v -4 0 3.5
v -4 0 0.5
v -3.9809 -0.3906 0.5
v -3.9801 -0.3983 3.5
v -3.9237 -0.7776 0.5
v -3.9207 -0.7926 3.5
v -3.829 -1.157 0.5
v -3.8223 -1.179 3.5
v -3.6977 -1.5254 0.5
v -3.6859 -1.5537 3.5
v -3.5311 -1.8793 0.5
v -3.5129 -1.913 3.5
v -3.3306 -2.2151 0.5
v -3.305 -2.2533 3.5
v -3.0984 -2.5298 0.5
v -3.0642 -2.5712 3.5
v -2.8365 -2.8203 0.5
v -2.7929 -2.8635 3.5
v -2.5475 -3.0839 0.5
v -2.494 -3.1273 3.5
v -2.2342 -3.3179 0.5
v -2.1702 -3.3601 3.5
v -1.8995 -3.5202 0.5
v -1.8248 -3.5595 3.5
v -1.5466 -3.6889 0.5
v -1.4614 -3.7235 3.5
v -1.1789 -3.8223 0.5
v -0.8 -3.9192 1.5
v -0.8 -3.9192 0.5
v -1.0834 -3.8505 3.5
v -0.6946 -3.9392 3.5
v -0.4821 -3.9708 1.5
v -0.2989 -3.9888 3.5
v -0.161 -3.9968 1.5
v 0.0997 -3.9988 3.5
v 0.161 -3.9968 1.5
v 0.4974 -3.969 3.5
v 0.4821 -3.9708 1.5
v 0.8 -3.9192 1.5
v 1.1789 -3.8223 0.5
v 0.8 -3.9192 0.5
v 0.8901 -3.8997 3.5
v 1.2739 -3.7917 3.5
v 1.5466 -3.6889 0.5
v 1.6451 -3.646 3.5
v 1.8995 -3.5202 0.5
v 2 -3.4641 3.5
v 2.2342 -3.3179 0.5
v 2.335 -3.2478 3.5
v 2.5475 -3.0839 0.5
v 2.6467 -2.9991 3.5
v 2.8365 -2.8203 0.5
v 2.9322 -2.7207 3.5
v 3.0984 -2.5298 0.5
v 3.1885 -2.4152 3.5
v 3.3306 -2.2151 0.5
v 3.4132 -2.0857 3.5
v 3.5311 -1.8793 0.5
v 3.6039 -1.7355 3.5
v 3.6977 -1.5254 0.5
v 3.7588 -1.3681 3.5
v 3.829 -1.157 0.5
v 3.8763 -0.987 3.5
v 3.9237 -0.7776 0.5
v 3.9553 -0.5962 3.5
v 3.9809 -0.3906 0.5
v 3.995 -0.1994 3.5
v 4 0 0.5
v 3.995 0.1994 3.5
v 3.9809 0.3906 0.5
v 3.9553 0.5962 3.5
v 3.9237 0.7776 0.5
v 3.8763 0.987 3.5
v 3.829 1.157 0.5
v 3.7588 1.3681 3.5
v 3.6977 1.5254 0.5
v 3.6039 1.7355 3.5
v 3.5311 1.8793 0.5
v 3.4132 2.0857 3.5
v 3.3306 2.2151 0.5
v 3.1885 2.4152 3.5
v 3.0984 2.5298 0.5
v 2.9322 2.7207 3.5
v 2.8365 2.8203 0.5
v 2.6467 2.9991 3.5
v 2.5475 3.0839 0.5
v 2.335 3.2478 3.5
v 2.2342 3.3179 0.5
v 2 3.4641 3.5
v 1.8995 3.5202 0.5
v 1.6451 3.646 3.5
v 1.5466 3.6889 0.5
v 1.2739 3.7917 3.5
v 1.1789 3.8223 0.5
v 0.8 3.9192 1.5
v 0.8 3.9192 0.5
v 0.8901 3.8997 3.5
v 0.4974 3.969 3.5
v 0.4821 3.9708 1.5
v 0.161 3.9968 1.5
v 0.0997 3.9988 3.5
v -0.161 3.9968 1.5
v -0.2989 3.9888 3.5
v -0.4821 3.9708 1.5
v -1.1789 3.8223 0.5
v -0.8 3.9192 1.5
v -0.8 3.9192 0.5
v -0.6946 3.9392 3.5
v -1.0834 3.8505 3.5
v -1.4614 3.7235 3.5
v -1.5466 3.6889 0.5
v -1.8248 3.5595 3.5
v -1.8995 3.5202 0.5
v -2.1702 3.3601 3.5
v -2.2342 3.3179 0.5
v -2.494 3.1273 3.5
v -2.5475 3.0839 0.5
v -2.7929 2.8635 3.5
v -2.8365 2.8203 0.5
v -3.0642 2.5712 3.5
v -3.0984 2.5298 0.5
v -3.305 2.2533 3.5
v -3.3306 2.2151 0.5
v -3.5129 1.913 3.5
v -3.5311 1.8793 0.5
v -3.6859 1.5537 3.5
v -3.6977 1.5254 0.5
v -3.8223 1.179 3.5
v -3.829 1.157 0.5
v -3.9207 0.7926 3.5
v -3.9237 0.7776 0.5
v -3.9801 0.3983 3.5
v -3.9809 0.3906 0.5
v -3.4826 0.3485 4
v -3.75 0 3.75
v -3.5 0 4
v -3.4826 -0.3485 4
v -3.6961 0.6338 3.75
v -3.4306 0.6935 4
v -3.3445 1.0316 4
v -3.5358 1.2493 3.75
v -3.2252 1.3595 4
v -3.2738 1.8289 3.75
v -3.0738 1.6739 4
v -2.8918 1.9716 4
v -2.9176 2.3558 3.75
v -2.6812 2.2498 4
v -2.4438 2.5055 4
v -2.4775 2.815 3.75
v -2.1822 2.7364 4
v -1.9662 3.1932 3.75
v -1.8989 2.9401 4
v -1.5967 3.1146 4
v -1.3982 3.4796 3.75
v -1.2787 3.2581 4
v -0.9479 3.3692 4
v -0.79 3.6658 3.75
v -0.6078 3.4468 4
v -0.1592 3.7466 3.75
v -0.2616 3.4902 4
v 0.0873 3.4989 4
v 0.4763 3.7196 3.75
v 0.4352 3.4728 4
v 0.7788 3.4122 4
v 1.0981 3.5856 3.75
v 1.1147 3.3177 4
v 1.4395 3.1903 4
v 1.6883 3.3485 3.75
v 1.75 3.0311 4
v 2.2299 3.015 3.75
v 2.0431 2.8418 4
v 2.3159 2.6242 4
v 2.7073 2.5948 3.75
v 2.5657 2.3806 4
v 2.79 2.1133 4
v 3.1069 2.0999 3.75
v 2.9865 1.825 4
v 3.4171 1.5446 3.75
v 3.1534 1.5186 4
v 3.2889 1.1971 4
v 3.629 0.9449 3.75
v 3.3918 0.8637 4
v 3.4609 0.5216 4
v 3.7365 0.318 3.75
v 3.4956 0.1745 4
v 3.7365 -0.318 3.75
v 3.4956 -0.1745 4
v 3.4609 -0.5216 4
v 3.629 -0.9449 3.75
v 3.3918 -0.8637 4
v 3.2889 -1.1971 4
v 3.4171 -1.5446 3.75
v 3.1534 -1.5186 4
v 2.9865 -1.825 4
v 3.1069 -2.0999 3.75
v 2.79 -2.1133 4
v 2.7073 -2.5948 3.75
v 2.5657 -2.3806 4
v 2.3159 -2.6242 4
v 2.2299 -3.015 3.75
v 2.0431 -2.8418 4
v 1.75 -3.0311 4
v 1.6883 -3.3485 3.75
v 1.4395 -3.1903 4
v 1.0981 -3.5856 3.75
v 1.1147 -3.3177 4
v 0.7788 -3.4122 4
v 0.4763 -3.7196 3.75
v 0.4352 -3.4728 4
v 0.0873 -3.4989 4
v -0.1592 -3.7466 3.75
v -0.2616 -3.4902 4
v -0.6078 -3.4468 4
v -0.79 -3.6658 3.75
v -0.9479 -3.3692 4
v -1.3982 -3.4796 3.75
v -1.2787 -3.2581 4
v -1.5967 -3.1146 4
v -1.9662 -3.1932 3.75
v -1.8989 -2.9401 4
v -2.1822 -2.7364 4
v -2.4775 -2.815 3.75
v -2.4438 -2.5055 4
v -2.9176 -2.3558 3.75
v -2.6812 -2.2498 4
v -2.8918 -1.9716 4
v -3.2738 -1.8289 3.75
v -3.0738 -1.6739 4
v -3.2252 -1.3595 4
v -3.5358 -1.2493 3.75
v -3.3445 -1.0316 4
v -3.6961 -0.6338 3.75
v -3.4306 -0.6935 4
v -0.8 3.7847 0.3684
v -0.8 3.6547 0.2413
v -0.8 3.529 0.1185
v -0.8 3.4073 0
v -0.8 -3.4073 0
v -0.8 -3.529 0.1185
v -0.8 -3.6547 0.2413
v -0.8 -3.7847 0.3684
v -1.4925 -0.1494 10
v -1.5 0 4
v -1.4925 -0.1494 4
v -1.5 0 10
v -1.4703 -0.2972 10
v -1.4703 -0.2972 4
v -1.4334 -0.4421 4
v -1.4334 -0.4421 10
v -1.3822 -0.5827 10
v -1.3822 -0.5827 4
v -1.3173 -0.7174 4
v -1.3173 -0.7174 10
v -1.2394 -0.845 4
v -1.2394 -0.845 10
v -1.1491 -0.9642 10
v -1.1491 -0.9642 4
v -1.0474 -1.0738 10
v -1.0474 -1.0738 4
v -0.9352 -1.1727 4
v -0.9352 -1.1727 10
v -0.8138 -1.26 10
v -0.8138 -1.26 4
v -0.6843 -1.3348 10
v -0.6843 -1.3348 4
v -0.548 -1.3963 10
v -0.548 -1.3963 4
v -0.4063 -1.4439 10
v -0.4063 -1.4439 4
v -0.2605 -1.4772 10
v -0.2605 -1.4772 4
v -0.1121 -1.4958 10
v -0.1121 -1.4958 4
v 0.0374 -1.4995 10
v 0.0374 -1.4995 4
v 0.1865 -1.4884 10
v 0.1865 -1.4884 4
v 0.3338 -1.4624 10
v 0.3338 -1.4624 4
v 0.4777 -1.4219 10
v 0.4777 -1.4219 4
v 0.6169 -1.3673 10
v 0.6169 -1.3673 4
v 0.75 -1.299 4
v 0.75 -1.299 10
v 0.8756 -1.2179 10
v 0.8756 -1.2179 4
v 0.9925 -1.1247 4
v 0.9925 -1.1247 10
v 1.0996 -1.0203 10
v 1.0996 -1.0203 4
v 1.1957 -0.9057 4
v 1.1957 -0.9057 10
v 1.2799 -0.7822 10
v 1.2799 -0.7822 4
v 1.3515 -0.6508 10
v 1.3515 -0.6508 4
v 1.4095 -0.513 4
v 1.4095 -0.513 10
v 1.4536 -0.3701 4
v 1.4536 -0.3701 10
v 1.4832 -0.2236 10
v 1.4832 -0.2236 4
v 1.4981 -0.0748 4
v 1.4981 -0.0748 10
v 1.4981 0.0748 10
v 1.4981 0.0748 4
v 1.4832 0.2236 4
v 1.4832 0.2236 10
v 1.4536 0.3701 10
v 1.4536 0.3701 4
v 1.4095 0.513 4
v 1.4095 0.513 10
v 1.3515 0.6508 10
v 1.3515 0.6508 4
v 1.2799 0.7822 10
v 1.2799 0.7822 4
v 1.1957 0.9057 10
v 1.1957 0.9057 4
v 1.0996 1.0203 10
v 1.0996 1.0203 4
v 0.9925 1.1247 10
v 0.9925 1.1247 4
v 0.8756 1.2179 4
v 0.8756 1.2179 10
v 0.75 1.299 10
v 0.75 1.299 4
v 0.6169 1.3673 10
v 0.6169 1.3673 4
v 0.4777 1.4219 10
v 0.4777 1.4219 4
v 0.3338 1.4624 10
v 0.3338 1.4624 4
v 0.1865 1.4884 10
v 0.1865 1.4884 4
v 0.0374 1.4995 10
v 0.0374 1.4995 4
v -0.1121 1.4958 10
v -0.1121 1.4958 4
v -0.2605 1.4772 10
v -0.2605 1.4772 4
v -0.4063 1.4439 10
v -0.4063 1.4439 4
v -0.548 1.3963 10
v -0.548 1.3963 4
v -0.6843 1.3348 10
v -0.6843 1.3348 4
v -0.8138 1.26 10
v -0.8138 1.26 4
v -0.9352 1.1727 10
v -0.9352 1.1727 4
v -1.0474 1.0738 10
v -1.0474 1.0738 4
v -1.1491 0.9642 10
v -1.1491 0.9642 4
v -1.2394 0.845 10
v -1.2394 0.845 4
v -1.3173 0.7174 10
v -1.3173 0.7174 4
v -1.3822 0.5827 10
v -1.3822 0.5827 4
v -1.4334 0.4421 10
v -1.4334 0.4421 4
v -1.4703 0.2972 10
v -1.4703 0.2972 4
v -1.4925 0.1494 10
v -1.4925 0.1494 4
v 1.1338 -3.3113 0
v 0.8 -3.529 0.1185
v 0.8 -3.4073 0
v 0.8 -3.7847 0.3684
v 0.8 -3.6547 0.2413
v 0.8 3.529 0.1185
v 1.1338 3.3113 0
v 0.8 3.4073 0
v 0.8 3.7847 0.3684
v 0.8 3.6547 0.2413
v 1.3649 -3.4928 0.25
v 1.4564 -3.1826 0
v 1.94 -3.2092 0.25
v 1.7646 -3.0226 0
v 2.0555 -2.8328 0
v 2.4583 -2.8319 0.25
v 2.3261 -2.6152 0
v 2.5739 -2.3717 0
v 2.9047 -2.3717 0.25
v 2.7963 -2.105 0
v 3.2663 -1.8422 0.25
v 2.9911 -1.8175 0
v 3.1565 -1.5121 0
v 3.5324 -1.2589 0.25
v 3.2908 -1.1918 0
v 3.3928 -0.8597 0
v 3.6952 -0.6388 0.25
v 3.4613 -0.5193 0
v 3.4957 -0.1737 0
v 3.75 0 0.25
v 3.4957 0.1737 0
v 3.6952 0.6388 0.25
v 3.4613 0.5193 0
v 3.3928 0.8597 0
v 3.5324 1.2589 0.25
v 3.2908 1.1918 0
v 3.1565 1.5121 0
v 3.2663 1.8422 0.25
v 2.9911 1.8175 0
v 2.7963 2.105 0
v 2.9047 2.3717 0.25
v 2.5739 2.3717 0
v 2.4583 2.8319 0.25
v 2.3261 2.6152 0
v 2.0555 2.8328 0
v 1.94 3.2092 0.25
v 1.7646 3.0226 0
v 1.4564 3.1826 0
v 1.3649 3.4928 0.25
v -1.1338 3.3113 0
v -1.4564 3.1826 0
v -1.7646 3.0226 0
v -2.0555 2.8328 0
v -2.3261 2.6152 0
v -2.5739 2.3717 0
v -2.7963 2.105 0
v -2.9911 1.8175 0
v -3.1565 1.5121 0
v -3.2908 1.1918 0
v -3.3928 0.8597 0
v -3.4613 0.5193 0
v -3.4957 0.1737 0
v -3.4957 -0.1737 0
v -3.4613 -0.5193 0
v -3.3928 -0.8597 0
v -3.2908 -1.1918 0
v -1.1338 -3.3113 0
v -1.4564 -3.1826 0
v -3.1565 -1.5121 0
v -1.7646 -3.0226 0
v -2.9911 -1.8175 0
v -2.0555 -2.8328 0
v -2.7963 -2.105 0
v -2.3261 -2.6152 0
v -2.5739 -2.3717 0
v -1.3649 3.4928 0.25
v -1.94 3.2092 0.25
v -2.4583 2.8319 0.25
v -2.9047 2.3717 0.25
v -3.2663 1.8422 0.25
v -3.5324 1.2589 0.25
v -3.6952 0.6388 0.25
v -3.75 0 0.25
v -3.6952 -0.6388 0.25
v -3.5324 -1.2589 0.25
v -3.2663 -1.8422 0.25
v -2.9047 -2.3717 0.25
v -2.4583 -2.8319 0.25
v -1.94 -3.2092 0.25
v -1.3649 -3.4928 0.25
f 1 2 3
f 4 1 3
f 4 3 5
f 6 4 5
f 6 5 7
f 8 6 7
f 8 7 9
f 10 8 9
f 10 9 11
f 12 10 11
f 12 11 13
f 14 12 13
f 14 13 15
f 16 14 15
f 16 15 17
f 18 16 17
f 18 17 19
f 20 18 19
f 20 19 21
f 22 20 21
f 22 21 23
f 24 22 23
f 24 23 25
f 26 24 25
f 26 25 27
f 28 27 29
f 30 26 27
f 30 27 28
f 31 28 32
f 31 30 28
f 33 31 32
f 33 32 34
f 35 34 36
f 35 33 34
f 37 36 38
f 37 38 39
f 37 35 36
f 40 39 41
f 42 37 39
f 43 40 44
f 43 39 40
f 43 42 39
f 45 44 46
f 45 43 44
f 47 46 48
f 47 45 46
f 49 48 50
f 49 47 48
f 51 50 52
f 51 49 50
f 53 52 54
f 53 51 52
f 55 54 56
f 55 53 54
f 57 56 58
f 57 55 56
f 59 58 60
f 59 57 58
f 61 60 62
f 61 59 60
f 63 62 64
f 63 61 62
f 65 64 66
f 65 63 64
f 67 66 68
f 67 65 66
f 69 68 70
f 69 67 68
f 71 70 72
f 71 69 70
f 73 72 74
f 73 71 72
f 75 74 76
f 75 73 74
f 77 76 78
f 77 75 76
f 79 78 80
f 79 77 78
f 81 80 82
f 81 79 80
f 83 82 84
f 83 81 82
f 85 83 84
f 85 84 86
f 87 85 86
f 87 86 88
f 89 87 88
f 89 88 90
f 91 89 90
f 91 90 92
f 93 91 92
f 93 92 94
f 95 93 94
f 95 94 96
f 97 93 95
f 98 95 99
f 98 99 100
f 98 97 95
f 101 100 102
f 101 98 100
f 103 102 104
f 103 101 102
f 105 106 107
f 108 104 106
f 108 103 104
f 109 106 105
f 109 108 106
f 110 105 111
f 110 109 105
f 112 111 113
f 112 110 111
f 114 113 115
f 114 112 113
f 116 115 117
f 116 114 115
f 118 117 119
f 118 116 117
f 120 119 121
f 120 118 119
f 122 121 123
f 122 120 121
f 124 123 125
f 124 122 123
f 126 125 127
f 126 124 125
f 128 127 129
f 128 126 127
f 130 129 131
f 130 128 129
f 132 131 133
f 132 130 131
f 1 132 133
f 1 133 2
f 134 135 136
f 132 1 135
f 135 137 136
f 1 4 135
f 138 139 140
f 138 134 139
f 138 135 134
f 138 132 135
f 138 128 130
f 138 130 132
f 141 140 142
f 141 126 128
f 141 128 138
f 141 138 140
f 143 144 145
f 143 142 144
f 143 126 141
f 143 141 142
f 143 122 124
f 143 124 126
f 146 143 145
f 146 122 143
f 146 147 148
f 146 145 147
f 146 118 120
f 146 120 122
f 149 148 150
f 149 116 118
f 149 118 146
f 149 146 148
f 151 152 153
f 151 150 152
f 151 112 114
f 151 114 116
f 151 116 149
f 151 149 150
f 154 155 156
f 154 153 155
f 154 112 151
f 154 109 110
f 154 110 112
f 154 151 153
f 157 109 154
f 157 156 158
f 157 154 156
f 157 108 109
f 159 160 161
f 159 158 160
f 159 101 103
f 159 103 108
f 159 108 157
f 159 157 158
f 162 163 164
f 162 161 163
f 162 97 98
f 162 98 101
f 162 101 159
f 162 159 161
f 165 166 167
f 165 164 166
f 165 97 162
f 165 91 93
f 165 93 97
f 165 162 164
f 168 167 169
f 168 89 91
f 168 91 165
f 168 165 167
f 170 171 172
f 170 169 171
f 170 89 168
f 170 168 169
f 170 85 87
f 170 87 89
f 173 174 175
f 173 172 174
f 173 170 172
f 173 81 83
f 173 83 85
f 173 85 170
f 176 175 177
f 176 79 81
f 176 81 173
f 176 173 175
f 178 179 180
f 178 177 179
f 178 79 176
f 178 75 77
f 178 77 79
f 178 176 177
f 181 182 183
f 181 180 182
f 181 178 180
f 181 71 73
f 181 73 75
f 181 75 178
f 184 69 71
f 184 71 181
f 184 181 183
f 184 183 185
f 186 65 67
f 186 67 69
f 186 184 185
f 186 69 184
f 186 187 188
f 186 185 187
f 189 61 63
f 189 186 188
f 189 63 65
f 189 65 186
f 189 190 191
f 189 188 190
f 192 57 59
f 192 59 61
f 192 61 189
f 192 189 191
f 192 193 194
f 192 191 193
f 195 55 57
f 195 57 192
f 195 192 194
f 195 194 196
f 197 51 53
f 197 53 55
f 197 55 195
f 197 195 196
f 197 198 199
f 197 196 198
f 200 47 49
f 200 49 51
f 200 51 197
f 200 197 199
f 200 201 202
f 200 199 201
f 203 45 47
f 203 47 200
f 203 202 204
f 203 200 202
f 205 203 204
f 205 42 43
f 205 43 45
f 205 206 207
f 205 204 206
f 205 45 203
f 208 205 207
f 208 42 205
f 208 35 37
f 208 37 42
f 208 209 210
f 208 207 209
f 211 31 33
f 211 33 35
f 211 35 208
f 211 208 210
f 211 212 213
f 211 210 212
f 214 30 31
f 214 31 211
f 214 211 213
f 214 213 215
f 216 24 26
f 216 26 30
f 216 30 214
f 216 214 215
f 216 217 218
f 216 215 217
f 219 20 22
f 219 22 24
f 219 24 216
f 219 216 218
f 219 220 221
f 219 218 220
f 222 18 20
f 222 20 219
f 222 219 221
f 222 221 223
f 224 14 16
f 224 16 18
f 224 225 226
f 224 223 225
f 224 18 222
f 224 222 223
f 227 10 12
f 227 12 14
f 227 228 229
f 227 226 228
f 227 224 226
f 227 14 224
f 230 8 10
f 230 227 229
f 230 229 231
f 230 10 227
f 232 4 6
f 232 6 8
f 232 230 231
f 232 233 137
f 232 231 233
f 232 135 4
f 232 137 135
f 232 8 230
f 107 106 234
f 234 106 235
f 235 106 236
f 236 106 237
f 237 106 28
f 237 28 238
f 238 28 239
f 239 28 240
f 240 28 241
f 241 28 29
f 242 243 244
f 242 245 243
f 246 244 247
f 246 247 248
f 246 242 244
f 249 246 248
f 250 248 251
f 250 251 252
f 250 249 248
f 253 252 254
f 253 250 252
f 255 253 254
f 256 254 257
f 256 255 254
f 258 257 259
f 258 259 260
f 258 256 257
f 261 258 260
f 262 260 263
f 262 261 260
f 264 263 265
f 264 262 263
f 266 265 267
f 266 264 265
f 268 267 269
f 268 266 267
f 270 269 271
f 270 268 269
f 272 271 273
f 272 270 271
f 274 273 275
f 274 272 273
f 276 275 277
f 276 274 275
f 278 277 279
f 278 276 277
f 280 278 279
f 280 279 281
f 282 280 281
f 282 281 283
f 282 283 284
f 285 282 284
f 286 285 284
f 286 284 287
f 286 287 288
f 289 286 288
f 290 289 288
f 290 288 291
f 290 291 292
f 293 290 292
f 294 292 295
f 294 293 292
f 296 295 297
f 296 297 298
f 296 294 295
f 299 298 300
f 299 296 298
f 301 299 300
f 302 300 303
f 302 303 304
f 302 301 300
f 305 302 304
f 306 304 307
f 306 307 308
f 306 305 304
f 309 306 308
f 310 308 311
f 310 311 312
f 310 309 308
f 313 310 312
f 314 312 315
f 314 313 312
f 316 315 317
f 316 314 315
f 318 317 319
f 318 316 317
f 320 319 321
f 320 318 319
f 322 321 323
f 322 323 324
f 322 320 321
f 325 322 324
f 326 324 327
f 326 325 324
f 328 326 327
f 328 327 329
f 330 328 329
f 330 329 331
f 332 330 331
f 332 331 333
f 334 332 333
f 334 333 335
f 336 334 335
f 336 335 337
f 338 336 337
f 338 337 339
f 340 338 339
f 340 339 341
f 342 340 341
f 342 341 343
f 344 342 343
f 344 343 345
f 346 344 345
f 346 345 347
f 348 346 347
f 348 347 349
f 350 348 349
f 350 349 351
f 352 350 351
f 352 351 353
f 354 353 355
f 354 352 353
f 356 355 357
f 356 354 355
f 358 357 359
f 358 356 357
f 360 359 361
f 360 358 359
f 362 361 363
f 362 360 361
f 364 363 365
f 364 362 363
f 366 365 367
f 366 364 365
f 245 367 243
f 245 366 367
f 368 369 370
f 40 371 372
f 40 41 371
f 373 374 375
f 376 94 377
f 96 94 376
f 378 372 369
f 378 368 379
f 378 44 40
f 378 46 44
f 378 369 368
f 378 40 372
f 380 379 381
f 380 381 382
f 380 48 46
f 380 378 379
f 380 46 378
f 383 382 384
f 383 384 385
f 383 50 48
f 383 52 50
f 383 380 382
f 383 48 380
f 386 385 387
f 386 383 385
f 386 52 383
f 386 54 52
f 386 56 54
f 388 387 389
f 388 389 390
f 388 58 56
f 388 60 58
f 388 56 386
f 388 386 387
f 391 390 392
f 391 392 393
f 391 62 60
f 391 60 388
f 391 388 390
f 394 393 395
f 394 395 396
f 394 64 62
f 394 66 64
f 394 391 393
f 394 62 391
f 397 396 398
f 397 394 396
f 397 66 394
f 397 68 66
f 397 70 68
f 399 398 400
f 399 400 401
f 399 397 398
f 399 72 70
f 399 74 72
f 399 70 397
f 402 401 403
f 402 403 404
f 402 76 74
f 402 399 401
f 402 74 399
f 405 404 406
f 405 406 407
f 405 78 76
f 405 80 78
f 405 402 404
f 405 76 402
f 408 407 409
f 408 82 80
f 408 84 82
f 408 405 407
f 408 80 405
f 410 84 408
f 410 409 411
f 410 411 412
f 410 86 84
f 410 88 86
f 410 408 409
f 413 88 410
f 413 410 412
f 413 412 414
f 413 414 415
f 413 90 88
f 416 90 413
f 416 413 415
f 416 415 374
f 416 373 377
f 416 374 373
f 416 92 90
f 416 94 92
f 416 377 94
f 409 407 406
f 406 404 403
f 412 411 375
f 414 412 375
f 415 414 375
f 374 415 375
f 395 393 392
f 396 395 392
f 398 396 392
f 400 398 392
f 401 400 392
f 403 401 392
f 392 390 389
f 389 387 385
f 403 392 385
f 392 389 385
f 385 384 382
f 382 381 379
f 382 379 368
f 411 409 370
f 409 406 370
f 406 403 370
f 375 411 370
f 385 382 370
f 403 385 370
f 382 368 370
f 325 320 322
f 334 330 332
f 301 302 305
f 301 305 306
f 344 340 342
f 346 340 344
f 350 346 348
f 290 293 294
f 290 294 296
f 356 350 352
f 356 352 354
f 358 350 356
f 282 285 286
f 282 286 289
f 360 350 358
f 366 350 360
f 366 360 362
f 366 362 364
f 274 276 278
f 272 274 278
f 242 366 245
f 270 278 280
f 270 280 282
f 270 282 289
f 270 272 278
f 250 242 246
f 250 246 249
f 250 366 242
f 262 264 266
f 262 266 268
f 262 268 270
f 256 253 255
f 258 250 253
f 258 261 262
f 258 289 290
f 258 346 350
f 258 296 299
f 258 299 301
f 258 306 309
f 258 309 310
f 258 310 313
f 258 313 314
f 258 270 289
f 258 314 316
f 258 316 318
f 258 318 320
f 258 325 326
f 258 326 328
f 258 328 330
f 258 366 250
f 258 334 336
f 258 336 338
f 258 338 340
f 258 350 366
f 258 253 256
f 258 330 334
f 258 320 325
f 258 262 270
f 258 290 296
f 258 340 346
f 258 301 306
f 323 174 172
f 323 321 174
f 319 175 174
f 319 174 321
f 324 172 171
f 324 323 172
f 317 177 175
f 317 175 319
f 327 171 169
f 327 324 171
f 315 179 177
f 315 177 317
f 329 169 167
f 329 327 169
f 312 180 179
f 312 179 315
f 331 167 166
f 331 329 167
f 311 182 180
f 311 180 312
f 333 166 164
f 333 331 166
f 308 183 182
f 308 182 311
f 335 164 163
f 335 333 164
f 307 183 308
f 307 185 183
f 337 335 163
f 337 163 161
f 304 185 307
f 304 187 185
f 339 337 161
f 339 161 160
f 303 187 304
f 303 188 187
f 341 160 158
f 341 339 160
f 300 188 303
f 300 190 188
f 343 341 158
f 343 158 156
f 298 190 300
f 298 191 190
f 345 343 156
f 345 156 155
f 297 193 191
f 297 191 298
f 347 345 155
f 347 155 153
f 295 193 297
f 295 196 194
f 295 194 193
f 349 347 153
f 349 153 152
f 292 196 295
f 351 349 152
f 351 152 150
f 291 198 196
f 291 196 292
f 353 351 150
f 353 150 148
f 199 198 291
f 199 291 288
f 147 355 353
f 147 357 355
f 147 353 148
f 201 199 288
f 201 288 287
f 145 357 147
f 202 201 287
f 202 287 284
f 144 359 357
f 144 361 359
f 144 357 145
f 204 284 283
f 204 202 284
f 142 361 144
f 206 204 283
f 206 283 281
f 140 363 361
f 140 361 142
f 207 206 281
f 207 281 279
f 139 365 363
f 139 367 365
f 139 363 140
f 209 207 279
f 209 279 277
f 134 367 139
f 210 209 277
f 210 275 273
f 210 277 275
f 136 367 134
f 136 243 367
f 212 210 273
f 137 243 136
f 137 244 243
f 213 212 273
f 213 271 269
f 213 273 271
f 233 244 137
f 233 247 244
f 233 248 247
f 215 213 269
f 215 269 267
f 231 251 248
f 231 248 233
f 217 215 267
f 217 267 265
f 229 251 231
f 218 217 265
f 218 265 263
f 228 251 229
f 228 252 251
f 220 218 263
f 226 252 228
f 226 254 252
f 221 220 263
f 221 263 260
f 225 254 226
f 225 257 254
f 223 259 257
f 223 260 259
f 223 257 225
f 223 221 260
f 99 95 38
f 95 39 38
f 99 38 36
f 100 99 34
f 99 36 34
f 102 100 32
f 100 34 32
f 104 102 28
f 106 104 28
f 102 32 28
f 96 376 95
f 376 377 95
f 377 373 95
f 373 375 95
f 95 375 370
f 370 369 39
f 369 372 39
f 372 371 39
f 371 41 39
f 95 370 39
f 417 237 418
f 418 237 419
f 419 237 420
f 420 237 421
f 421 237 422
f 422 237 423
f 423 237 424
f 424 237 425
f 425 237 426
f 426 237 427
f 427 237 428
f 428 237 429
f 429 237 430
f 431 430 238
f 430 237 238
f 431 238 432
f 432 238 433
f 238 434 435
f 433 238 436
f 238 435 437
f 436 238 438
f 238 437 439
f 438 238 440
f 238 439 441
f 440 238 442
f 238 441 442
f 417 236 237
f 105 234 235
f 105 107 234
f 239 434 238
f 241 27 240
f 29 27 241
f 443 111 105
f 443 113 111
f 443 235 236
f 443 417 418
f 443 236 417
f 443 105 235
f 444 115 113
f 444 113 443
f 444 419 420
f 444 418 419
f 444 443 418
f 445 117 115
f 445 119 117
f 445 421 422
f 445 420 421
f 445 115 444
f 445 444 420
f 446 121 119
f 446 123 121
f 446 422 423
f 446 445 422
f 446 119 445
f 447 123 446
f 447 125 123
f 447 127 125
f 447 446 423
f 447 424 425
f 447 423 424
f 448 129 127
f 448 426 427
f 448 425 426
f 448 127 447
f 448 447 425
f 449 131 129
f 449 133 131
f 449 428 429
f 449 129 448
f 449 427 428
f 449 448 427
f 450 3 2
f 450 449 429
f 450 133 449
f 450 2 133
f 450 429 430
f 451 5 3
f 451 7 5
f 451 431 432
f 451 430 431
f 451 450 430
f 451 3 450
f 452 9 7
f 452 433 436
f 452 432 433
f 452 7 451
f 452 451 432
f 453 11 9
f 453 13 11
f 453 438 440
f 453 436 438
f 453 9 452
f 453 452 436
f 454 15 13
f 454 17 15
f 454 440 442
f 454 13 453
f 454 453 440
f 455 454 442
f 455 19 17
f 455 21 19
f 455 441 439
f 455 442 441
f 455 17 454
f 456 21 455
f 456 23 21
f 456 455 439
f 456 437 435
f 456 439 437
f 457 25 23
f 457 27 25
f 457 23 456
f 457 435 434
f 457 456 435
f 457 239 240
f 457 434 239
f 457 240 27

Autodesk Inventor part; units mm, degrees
ref_plane "YZ Plane" through (0, 0, 0) normal (1, 0, 0) x (0, 1, 0)
ref_plane "XZ Plane" through (0, 0, 0) normal (0, 1, 0) x (-1, 0, 0)
ref_plane "XY Plane" through (0, 0, 0) normal (0, 0, 1) x (1, 0, 0)
sketch "スケッチ1" plane through (0, 0, 0) normal (0, 1, 0) x (-1, 0, 0)
  line L0 (0, 0) -> (0, 10)
  line L1 (0, 0) -> (3.5, 0)
  line L2 (4, 0.5) -> (4, 3.5)
  line L3 (3.5, 4) -> (1.5, 4)
  line L4 (1.5, 4) -> (1.5, 10)
  line L5 (1.5, 10) -> (0, 10)
  line L6 (-0.8, 1.5) -> (0.8, 1.5)
  line L7 (0.8, 1.5) -> (0.8, 0)
  line L8 (0.8, 0) -> (-0.8, 0)
  line L9 (-0.8, 0) -> (-0.8, 1.5)
  line L10 (-0.8, 1.5) -> (0.8, 0) construction
  line L11 (0.8, 1.5) -> (-0.8, 0) construction
  line L12 (3.5, 0) -> (4, 0.5)
  line L13 (4, 3.5) -> (3.5, 4)
  point P0 (4, 0)
  point P1 (4, 4)
  point P2 (0, 0.75)
  dimension "d7" = 4
  dimension "d8" = 6
  dimension "d12" = 3
  dimension "d13" = 8
  dimension "d20" = 1.5
  dimension "d21" = 1.6
  dimension "d24" = 0.5
  dimension "d25" = 0.5
  dimension "d26" = 0.5
  dimension "d27" = 0.5
revolve "回転1" add sketch "スケッチ1" angle 360 about axis through (0, 0, 0) along (0, 0, 1) contours L0 L6 L7 L1 | L0 L5 L4 L3 L13 L2 L12 L1 L7 L6
thread "ねじ1" size "M3x0.5" class "6g" standard "ANSI Metric M Profile" full length
extrude "押し出し1" cut sketch "スケッチ1" along normal through all both and the other way through all contours L8 L9 L6 L0 | L0 L6 L7 L1
equation "\"d25\" = d24"
equation "\"d26\" = d24"
equation "\"d27\" = d26"
properties part number "CSMKN-SUSTBS-M3-6" material "ステンレス鋼 AISI 304"
